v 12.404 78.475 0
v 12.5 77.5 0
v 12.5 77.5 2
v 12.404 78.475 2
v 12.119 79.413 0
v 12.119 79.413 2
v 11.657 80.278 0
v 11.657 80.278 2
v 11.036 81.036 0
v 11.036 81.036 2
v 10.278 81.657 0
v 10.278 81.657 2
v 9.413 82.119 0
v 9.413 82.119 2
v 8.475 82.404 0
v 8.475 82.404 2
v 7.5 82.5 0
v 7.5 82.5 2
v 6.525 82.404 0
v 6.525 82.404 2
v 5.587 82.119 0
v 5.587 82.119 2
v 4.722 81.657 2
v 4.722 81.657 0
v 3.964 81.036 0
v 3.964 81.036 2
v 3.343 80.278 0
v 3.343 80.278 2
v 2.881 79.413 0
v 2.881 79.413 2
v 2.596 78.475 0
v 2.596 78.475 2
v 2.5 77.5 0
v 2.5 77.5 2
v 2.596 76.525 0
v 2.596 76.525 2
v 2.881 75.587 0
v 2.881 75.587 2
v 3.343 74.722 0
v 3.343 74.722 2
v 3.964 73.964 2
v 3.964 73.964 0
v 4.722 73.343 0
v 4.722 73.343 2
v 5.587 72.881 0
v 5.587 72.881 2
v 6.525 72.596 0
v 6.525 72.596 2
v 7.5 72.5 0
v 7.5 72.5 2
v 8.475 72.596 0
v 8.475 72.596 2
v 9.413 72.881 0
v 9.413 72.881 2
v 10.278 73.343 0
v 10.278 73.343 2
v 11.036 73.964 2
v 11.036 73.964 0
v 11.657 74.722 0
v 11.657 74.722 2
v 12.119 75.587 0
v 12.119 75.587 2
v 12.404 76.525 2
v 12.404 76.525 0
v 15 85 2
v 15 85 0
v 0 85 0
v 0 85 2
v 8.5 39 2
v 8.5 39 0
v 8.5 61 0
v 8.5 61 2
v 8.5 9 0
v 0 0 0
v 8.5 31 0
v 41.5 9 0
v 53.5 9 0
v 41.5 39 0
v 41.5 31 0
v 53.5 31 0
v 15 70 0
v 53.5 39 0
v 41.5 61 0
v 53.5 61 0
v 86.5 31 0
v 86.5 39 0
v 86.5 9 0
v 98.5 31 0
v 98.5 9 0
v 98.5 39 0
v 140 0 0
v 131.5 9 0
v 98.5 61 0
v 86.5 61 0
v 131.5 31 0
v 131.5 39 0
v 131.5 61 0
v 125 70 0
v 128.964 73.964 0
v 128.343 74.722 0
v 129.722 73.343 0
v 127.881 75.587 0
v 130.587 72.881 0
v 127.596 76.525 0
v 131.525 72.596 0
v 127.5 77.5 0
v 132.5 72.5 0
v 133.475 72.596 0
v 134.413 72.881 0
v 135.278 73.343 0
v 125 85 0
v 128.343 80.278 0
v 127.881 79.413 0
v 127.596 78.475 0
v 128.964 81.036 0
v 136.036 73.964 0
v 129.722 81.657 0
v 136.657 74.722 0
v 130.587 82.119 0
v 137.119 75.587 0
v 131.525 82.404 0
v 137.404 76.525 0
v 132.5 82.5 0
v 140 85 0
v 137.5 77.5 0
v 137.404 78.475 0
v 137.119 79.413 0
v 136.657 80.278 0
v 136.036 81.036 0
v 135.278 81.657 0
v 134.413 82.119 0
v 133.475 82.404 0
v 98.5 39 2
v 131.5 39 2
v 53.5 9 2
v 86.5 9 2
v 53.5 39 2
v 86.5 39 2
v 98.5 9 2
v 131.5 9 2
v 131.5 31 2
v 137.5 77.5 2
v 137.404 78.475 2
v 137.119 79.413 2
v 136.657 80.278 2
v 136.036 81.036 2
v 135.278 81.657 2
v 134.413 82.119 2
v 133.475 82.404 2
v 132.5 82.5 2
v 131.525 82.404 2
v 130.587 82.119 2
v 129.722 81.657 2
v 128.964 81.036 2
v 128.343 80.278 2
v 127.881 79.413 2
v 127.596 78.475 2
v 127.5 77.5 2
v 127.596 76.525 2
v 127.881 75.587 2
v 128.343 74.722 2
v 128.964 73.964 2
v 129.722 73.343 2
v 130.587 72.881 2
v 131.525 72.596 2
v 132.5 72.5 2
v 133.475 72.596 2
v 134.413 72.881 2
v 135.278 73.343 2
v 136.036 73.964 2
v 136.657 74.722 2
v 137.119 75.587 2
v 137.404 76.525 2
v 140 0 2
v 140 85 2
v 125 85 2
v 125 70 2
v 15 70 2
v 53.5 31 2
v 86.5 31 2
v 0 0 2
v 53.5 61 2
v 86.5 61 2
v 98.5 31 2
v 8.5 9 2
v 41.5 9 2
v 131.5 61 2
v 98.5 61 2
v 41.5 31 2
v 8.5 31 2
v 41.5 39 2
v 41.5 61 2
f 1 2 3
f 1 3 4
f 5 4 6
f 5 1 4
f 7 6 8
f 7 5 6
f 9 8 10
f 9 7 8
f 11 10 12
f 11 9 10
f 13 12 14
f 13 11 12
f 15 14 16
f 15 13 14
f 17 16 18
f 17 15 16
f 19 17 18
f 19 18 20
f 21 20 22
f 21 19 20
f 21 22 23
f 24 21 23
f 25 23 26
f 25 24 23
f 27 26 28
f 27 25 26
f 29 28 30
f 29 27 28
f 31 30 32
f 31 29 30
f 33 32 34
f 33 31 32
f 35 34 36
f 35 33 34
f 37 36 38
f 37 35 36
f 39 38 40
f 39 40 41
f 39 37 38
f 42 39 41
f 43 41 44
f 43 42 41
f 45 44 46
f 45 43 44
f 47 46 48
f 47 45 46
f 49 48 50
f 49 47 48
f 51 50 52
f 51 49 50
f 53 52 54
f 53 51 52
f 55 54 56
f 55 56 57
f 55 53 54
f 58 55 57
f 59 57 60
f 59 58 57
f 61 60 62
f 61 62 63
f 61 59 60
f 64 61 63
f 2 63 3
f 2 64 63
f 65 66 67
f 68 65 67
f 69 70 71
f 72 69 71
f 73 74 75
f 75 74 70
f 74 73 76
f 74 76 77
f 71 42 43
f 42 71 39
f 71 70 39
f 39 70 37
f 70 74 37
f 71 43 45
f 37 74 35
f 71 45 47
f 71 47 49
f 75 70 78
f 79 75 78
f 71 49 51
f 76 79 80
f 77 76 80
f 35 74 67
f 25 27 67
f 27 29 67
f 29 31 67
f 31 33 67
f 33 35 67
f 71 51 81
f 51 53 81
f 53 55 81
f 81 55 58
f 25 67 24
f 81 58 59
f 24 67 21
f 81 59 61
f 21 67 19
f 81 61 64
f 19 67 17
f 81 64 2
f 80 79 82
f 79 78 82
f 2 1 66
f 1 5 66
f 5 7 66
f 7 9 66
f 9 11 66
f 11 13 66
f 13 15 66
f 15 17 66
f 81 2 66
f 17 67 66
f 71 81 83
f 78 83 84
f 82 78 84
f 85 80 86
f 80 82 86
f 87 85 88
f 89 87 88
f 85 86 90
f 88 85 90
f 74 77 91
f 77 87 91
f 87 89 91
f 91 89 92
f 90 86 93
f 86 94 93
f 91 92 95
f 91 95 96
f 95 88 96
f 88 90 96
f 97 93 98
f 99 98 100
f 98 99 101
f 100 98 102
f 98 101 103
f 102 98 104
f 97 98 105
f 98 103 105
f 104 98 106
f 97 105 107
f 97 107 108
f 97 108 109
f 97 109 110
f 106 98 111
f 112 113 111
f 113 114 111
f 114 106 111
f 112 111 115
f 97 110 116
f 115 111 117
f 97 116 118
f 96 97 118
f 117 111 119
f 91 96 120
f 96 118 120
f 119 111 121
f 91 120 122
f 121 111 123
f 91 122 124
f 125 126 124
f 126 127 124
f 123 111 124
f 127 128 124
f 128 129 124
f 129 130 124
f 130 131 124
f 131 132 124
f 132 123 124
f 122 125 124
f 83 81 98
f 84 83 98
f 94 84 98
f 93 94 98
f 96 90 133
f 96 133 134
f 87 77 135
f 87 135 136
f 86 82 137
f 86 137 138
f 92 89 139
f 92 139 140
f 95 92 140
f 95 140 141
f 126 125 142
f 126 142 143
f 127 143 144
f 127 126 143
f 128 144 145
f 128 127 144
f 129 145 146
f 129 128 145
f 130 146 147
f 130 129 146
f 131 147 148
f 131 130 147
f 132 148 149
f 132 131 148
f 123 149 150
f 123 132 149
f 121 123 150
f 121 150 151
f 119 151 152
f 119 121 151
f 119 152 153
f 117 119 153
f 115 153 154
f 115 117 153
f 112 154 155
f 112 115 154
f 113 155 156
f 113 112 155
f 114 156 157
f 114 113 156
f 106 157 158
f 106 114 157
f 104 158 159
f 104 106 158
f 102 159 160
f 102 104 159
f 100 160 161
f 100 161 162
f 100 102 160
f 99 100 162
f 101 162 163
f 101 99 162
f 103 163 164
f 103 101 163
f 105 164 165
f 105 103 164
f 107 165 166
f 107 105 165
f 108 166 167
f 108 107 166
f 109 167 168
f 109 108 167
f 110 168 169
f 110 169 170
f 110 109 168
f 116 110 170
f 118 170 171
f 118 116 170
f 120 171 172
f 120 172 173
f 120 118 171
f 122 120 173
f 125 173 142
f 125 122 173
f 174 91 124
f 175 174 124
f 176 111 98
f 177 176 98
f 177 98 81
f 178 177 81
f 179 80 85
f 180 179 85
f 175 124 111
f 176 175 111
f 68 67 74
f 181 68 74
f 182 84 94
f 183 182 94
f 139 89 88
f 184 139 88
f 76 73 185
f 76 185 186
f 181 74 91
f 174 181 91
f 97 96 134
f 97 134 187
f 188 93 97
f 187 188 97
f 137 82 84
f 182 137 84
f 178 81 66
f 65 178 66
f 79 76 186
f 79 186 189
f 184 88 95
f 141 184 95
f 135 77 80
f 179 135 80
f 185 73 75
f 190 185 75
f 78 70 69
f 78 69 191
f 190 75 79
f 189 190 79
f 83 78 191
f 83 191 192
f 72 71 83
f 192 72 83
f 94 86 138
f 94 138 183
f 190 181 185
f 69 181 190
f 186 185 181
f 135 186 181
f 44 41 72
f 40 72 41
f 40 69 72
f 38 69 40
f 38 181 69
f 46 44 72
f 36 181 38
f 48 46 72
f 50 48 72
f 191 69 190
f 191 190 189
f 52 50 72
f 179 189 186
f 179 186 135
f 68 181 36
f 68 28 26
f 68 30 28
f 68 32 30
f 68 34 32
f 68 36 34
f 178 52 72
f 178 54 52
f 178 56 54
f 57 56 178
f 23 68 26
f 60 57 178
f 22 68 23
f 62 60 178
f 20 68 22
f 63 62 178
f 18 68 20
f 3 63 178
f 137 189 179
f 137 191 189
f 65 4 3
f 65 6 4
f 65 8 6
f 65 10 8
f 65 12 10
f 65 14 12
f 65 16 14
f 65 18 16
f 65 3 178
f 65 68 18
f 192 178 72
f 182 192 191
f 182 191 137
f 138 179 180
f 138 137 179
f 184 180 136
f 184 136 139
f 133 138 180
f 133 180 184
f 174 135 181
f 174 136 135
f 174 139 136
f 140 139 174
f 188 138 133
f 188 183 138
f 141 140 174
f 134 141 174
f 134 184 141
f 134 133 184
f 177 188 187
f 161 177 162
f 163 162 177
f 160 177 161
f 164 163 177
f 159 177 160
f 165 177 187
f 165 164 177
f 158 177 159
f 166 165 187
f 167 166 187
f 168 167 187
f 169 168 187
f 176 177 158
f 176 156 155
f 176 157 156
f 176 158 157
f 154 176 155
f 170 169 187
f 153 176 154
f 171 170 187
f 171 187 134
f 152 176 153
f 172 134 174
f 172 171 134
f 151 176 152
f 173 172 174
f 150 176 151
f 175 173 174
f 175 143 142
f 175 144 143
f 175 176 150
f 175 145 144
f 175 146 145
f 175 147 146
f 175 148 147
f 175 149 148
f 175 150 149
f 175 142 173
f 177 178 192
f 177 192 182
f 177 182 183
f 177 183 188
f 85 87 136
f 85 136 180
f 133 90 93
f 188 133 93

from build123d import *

# Parameters (mm, degrees)
F0_W     = 33
F0_H     = 22
F0_R     = 5
F1_DEPTH = 2


with BuildPart() as f1:
    # F0 (on Top) → F1 (new body)
    with BuildSketch(Plane.XY):
        Polygon((0, 70), (0, 0), (140, 0), (140, 70), (140, 85), (125, 85), (125, 70), (15, 70), (15, 85), (0, 85), align=None)
        with Locations((25, 20)):
            Rectangle(F0_W, F0_H, mode=Mode.SUBTRACT)
        with Locations((70, 20)):
            Rectangle(F0_W, F0_H, mode=Mode.SUBTRACT)
        with Locations((115, 20)):
            Rectangle(F0_W, F0_H, mode=Mode.SUBTRACT)
        with Locations((25, 50)):
            Rectangle(F0_W, F0_H, mode=Mode.SUBTRACT)
        with Locations((7.5, 77.5)):
            Circle(F0_R, mode=Mode.SUBTRACT)
        with Locations((70, 50)):
            Rectangle(F0_W, F0_H, mode=Mode.SUBTRACT)
        with Locations((115, 50)):
            Rectangle(F0_W, F0_H, mode=Mode.SUBTRACT)
        with Locations((132.5, 77.5)):
            Circle(F0_R, mode=Mode.SUBTRACT)
    extrude(amount=F1_DEPTH)


solid = f1.part
